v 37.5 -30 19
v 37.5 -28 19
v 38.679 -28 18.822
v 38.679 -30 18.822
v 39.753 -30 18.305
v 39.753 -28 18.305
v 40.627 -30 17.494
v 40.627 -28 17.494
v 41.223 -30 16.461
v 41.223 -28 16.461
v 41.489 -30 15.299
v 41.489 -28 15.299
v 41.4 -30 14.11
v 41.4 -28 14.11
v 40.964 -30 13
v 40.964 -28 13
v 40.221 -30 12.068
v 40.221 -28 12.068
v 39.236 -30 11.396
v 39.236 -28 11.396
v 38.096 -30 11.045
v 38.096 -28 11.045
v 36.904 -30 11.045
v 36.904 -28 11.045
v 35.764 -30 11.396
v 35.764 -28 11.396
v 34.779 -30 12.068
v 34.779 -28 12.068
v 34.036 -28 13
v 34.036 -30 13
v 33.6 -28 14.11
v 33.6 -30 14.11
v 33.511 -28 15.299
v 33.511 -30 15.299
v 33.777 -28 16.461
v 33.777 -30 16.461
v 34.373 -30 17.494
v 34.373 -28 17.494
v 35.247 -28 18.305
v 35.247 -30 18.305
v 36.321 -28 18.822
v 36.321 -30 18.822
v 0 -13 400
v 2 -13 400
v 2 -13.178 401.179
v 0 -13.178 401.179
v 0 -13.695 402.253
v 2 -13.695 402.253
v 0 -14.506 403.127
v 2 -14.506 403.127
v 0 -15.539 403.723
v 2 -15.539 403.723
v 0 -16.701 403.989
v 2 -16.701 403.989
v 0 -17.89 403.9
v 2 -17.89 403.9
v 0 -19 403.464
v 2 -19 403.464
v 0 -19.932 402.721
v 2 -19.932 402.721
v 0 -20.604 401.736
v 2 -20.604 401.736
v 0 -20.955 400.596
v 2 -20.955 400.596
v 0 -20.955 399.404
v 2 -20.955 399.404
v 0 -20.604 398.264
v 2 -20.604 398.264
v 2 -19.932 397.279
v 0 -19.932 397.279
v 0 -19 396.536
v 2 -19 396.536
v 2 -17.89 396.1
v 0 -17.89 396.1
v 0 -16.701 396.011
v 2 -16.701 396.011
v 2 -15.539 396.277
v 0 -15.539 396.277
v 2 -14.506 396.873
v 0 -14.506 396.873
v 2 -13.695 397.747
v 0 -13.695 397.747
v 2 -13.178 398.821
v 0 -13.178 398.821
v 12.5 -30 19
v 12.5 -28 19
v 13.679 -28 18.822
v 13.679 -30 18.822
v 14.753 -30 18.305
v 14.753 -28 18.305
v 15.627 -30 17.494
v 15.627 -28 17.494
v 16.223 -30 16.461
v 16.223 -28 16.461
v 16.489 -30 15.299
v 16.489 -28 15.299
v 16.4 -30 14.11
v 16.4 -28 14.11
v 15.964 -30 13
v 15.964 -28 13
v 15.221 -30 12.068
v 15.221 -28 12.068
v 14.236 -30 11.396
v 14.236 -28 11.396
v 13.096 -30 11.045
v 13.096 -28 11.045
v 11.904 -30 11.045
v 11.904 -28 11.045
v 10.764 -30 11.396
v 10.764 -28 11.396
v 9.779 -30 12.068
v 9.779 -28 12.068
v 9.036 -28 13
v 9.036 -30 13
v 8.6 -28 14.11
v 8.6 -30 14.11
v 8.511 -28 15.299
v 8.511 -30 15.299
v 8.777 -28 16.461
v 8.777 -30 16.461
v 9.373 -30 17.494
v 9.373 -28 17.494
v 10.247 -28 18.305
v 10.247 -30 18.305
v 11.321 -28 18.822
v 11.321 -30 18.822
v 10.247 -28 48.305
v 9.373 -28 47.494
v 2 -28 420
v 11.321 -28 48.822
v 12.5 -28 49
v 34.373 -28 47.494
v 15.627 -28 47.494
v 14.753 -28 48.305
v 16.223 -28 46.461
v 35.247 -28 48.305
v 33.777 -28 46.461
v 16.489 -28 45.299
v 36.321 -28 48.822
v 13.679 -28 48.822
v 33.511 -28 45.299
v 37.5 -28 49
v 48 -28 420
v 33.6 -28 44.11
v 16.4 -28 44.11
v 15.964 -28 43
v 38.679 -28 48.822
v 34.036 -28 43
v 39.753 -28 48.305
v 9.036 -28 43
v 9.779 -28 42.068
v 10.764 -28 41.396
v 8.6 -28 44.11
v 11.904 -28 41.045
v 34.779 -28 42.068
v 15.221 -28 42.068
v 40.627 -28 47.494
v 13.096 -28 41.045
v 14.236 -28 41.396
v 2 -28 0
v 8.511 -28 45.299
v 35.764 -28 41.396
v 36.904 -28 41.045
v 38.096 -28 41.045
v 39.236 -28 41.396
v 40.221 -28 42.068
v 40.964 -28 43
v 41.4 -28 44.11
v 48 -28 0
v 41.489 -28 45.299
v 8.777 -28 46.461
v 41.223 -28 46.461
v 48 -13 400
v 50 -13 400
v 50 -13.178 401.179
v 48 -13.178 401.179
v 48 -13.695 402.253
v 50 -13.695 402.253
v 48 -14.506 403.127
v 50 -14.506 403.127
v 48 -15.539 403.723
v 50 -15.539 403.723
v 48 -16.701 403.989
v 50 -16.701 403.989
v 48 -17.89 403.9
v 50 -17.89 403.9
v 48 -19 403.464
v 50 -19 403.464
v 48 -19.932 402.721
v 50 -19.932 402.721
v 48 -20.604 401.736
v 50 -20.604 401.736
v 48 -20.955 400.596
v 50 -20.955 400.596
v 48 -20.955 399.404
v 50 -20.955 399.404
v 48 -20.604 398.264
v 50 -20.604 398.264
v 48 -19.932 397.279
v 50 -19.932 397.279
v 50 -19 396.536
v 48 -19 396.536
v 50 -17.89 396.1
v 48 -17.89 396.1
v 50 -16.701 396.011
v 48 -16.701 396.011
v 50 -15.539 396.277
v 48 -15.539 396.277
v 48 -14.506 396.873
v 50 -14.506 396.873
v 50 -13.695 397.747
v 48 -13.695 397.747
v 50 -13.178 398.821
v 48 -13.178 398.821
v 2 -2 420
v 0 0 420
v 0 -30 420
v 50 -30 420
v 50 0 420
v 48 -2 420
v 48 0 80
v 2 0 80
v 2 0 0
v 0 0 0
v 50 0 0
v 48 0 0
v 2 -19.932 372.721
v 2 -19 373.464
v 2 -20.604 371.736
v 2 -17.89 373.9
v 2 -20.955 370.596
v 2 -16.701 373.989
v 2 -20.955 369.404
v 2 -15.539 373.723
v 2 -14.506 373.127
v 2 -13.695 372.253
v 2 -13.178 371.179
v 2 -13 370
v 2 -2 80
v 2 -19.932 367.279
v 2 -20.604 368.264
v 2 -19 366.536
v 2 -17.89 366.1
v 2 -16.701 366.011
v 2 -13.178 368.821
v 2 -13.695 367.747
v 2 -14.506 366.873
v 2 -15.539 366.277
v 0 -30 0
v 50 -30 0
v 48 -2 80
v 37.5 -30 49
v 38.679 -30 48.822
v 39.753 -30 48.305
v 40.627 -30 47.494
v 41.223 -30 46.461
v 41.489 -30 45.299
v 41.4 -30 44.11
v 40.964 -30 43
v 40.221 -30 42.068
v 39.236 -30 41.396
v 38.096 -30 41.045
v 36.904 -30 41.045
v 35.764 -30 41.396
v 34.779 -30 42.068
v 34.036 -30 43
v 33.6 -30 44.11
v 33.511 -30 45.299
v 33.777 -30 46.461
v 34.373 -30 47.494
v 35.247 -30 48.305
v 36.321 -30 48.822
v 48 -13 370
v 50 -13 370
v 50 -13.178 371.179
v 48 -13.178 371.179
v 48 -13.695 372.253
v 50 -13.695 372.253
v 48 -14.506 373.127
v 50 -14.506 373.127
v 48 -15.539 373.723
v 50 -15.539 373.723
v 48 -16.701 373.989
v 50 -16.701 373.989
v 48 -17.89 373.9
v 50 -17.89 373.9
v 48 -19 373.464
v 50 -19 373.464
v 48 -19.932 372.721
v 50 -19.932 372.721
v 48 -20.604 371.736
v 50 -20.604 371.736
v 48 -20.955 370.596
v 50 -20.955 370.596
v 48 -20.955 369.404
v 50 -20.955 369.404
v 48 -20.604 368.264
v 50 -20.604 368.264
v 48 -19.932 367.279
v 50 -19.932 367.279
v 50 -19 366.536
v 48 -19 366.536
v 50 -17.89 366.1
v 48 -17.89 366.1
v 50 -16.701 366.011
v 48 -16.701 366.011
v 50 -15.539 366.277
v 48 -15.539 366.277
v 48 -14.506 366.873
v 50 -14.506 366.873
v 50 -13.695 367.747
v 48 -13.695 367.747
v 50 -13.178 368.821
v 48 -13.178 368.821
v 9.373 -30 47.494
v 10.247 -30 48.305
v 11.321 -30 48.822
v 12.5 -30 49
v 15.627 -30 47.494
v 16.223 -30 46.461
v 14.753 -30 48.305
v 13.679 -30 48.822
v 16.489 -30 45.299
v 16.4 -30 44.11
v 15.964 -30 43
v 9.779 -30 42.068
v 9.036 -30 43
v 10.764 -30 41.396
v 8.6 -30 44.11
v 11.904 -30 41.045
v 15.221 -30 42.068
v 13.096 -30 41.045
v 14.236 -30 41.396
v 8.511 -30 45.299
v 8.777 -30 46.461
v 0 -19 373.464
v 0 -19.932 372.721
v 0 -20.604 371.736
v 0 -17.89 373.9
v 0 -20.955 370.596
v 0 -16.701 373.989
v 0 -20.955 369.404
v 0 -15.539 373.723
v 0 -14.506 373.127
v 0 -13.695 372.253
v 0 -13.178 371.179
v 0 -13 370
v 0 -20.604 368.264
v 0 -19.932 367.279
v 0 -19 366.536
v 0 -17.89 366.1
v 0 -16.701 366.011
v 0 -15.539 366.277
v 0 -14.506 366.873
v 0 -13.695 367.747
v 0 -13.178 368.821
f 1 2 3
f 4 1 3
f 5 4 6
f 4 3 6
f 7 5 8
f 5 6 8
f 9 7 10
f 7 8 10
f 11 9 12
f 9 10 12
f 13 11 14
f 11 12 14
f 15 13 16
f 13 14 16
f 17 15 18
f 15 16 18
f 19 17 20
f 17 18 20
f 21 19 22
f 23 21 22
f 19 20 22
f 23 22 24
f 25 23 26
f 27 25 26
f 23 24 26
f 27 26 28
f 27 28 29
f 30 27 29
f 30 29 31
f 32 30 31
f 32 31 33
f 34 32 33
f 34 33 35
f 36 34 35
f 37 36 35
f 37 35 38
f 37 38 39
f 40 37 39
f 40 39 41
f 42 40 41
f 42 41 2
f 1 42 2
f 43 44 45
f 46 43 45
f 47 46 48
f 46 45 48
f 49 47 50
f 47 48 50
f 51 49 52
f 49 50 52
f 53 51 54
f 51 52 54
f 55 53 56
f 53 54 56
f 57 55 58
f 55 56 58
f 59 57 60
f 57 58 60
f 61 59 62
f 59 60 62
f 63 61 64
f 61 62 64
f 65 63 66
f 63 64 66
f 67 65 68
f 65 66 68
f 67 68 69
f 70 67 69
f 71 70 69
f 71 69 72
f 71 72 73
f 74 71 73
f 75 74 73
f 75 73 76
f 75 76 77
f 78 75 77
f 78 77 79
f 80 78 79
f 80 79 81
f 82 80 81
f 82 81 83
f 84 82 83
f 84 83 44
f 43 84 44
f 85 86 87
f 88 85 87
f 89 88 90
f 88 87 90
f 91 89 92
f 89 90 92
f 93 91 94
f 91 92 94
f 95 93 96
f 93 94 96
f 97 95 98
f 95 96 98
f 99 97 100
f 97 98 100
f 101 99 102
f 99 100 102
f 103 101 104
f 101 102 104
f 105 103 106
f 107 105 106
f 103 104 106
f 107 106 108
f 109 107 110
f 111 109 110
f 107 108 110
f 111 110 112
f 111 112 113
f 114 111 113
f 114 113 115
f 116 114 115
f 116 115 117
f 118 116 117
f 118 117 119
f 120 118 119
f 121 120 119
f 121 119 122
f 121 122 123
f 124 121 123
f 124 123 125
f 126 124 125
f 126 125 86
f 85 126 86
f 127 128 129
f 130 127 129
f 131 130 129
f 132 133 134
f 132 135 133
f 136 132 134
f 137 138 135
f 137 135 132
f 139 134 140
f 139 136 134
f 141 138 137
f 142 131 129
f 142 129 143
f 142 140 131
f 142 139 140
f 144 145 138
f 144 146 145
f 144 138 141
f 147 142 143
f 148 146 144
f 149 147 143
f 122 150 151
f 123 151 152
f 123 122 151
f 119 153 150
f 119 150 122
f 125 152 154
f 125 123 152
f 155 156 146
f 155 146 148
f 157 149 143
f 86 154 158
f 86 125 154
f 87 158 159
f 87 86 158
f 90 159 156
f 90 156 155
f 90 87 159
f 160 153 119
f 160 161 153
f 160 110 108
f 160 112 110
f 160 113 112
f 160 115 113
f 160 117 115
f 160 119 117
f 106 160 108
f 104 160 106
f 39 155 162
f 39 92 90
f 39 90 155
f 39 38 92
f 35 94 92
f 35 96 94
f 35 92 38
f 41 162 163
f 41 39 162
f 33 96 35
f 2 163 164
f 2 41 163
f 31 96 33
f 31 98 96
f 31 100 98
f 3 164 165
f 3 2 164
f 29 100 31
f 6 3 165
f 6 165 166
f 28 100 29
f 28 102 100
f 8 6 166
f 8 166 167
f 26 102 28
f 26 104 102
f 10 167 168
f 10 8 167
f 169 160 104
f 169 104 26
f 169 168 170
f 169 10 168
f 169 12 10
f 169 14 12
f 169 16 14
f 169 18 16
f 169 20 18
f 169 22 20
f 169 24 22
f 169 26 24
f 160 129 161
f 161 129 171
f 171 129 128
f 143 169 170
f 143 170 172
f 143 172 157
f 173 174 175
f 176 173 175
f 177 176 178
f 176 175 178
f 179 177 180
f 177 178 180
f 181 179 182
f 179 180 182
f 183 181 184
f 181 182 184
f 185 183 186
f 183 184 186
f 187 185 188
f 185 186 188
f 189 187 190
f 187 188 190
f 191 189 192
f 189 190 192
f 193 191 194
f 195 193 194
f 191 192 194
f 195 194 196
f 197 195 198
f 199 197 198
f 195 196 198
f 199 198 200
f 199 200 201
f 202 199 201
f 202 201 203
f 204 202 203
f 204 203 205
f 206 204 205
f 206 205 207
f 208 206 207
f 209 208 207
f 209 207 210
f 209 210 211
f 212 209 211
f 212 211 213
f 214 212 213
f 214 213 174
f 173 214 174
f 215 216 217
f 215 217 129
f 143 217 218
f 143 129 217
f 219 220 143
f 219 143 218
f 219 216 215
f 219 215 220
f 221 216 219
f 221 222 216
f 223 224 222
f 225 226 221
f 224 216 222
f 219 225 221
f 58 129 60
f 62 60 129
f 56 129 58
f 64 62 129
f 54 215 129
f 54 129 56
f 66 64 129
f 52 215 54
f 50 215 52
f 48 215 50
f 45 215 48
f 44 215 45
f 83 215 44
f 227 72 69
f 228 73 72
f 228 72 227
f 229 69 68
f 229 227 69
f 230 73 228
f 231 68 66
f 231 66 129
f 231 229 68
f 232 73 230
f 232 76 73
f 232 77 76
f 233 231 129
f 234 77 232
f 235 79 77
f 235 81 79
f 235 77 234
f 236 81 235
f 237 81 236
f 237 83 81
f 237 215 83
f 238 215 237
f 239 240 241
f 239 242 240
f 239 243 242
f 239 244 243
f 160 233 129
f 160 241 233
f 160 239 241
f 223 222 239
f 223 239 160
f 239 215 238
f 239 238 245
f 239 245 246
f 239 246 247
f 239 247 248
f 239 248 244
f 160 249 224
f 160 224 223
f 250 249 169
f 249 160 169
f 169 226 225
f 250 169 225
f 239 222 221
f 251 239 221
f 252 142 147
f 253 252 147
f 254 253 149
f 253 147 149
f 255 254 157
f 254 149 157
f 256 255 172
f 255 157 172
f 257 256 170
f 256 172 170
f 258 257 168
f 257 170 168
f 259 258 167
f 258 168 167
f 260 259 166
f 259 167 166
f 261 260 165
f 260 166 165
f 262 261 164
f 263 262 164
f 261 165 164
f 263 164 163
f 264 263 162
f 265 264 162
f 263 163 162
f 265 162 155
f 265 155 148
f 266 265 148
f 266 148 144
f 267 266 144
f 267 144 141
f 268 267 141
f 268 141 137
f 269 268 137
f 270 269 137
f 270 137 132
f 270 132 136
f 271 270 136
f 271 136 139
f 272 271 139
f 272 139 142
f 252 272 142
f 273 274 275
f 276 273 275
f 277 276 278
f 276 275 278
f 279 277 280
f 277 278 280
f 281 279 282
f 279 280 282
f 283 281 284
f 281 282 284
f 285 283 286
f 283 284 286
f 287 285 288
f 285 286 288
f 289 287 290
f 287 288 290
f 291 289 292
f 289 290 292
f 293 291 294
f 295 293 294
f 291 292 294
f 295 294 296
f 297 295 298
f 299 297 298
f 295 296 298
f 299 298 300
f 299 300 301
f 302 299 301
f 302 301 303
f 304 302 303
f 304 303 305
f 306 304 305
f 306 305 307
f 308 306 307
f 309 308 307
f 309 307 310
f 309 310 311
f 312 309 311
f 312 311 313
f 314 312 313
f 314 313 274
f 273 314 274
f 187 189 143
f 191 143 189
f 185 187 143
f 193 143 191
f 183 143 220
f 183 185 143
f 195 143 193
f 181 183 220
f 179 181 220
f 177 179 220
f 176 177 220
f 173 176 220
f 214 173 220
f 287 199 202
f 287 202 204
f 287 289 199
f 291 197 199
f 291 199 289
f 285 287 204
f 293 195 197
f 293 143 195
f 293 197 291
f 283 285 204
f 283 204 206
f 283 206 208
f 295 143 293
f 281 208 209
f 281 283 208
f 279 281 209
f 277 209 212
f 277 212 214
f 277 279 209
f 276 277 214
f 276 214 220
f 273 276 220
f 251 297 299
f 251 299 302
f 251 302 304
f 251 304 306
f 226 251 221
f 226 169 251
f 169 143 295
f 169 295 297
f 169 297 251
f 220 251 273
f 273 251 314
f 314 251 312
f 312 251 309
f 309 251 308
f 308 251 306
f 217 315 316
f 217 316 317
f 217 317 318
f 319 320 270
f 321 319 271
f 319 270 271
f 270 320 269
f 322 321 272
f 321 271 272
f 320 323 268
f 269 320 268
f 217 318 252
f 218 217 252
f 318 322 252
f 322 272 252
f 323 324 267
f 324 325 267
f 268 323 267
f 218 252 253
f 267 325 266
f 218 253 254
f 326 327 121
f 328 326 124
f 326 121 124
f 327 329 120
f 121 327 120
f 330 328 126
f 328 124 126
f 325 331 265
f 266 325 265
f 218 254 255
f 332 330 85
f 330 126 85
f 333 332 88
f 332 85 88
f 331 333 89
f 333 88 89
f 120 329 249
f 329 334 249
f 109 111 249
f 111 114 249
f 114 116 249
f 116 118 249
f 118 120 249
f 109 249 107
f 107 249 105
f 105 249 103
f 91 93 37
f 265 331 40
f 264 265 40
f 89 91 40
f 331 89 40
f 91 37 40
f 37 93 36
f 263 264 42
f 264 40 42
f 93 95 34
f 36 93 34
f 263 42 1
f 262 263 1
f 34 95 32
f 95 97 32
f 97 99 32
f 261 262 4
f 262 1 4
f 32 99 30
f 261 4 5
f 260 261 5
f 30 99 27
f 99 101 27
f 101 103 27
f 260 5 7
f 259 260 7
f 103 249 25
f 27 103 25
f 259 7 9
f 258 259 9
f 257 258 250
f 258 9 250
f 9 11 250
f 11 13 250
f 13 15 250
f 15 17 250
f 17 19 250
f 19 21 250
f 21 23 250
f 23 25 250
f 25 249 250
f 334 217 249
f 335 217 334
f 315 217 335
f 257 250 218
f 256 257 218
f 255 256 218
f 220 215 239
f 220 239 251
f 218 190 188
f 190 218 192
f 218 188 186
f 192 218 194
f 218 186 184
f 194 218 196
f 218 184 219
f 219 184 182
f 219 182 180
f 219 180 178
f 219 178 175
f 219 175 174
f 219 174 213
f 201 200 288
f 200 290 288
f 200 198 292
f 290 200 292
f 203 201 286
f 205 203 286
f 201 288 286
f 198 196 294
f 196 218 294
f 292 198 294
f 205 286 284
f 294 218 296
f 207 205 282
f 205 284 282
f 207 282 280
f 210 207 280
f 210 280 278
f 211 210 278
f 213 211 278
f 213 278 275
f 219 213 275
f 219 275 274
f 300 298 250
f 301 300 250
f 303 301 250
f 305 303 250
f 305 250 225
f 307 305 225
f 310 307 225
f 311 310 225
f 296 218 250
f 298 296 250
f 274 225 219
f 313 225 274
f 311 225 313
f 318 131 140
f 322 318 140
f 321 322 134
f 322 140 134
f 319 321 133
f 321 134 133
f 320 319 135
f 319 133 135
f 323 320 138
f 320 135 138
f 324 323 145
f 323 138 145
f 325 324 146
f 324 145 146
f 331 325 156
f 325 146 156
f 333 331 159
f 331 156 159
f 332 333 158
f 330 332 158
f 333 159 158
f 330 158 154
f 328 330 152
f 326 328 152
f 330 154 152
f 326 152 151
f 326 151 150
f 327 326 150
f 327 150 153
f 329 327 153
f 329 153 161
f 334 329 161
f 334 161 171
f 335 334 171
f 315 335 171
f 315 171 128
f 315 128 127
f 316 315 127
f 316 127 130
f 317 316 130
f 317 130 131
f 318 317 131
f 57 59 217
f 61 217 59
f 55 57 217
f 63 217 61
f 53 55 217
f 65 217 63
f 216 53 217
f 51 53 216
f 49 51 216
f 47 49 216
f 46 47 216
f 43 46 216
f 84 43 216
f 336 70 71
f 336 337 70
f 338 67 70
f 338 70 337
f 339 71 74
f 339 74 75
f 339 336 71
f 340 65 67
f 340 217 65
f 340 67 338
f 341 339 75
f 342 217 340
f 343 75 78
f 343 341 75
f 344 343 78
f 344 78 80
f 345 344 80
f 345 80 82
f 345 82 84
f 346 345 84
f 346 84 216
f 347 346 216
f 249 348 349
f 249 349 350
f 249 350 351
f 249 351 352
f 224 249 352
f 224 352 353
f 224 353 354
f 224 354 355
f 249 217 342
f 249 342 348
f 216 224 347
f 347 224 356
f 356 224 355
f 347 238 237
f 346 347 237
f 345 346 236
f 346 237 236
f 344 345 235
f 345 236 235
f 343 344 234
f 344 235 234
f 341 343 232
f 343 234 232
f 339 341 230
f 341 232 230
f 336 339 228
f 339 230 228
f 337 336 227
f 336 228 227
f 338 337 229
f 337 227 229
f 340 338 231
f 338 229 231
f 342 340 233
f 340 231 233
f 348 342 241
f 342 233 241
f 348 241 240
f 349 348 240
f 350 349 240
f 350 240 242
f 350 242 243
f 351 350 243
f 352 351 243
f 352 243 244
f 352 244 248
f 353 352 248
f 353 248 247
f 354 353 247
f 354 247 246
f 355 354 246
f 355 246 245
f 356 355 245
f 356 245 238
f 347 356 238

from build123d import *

# Parameters (mm, degrees)
SKETCH1_W           = 50
SKETCH1_H           = 30
SKETCH1_W_2         = 46
SKETCH1_H_2         = 26
BOSS_EXTRUDE1_DEPTH = 420
SKETCH7_R           = 4
CUT_EXTRUDE2_DEPTH  = 424.89149555
SKETCH8_R           = 4
CUT_EXTRUDE3_DEPTH  = 425.028300942
CUT_EXTRUDE4_REACH  = 426.028
SKETCH9_W           = 46
SKETCH9_H           = 80


with BuildPart() as part:
    # Sketch1 → Boss-Extrude1 (new body)
    with BuildSketch(Plane.XY):
        with Locations((25, -15)):
            Rectangle(SKETCH1_W, SKETCH1_H)
        with Locations((25, -15)):
            Rectangle(SKETCH1_W_2, SKETCH1_H_2, mode=Mode.SUBTRACT)
    extrude(amount=BOSS_EXTRUDE1_DEPTH)

    # Sketch7 → Cut-Extrude2 (cut, through all)
    with BuildSketch(Plane(origin=(0, -28, 0), x_dir=(1, 0, 0), z_dir=(0, 1, 0))):
        with Locations(Location((37.5, -45, 0), (0, 0, 270))):
            Circle(SKETCH7_R)
        with Locations(Location((12.5, -45, 0), (0, 0, 270))):
            Circle(SKETCH7_R)
        with Locations(Location((12.5, -15, 0), (0, 0, 270))):
            Circle(SKETCH7_R)
        with Locations(Location((37.5, -15, 0), (0, 0, 270))):
            Circle(SKETCH7_R)
    extrude(amount=-CUT_EXTRUDE2_DEPTH, mode=Mode.SUBTRACT)

    # Sketch8 → Cut-Extrude3 (cut, through all)
    with BuildSketch(Plane(origin=(50, 0, 0), x_dir=(0, 0, -1), z_dir=(1, 0, 0))):
        with Locations(Location((-400, -17, 0), (0, 0, 90))):
            Circle(SKETCH8_R)
        with Locations(Location((-370, -17, 0), (0, 0, 90))):
            Circle(SKETCH8_R)
    extrude(amount=-CUT_EXTRUDE3_DEPTH, mode=Mode.SUBTRACT)

    # Sketch9 → Cut-Extrude4 (cut, up to next)
    with BuildSketch(Plane(origin=(0, 0, 0), x_dir=(1, 0, 0), z_dir=(0, 1, 0)), mode=Mode.PRIVATE) as cut_extrude4_sk1:
        with Locations((25, -40)):
            Rectangle(SKETCH9_W, SKETCH9_H)
    cut_extrude4_tool1 = extrude(cut_extrude4_sk1.sketch, amount=-CUT_EXTRUDE4_REACH, mode=Mode.PRIVATE) & part.part
    add(cut_extrude4_tool1.solids().sort_by_distance((25, 0, 40))[0], mode=Mode.SUBTRACT)


solid = part.part
